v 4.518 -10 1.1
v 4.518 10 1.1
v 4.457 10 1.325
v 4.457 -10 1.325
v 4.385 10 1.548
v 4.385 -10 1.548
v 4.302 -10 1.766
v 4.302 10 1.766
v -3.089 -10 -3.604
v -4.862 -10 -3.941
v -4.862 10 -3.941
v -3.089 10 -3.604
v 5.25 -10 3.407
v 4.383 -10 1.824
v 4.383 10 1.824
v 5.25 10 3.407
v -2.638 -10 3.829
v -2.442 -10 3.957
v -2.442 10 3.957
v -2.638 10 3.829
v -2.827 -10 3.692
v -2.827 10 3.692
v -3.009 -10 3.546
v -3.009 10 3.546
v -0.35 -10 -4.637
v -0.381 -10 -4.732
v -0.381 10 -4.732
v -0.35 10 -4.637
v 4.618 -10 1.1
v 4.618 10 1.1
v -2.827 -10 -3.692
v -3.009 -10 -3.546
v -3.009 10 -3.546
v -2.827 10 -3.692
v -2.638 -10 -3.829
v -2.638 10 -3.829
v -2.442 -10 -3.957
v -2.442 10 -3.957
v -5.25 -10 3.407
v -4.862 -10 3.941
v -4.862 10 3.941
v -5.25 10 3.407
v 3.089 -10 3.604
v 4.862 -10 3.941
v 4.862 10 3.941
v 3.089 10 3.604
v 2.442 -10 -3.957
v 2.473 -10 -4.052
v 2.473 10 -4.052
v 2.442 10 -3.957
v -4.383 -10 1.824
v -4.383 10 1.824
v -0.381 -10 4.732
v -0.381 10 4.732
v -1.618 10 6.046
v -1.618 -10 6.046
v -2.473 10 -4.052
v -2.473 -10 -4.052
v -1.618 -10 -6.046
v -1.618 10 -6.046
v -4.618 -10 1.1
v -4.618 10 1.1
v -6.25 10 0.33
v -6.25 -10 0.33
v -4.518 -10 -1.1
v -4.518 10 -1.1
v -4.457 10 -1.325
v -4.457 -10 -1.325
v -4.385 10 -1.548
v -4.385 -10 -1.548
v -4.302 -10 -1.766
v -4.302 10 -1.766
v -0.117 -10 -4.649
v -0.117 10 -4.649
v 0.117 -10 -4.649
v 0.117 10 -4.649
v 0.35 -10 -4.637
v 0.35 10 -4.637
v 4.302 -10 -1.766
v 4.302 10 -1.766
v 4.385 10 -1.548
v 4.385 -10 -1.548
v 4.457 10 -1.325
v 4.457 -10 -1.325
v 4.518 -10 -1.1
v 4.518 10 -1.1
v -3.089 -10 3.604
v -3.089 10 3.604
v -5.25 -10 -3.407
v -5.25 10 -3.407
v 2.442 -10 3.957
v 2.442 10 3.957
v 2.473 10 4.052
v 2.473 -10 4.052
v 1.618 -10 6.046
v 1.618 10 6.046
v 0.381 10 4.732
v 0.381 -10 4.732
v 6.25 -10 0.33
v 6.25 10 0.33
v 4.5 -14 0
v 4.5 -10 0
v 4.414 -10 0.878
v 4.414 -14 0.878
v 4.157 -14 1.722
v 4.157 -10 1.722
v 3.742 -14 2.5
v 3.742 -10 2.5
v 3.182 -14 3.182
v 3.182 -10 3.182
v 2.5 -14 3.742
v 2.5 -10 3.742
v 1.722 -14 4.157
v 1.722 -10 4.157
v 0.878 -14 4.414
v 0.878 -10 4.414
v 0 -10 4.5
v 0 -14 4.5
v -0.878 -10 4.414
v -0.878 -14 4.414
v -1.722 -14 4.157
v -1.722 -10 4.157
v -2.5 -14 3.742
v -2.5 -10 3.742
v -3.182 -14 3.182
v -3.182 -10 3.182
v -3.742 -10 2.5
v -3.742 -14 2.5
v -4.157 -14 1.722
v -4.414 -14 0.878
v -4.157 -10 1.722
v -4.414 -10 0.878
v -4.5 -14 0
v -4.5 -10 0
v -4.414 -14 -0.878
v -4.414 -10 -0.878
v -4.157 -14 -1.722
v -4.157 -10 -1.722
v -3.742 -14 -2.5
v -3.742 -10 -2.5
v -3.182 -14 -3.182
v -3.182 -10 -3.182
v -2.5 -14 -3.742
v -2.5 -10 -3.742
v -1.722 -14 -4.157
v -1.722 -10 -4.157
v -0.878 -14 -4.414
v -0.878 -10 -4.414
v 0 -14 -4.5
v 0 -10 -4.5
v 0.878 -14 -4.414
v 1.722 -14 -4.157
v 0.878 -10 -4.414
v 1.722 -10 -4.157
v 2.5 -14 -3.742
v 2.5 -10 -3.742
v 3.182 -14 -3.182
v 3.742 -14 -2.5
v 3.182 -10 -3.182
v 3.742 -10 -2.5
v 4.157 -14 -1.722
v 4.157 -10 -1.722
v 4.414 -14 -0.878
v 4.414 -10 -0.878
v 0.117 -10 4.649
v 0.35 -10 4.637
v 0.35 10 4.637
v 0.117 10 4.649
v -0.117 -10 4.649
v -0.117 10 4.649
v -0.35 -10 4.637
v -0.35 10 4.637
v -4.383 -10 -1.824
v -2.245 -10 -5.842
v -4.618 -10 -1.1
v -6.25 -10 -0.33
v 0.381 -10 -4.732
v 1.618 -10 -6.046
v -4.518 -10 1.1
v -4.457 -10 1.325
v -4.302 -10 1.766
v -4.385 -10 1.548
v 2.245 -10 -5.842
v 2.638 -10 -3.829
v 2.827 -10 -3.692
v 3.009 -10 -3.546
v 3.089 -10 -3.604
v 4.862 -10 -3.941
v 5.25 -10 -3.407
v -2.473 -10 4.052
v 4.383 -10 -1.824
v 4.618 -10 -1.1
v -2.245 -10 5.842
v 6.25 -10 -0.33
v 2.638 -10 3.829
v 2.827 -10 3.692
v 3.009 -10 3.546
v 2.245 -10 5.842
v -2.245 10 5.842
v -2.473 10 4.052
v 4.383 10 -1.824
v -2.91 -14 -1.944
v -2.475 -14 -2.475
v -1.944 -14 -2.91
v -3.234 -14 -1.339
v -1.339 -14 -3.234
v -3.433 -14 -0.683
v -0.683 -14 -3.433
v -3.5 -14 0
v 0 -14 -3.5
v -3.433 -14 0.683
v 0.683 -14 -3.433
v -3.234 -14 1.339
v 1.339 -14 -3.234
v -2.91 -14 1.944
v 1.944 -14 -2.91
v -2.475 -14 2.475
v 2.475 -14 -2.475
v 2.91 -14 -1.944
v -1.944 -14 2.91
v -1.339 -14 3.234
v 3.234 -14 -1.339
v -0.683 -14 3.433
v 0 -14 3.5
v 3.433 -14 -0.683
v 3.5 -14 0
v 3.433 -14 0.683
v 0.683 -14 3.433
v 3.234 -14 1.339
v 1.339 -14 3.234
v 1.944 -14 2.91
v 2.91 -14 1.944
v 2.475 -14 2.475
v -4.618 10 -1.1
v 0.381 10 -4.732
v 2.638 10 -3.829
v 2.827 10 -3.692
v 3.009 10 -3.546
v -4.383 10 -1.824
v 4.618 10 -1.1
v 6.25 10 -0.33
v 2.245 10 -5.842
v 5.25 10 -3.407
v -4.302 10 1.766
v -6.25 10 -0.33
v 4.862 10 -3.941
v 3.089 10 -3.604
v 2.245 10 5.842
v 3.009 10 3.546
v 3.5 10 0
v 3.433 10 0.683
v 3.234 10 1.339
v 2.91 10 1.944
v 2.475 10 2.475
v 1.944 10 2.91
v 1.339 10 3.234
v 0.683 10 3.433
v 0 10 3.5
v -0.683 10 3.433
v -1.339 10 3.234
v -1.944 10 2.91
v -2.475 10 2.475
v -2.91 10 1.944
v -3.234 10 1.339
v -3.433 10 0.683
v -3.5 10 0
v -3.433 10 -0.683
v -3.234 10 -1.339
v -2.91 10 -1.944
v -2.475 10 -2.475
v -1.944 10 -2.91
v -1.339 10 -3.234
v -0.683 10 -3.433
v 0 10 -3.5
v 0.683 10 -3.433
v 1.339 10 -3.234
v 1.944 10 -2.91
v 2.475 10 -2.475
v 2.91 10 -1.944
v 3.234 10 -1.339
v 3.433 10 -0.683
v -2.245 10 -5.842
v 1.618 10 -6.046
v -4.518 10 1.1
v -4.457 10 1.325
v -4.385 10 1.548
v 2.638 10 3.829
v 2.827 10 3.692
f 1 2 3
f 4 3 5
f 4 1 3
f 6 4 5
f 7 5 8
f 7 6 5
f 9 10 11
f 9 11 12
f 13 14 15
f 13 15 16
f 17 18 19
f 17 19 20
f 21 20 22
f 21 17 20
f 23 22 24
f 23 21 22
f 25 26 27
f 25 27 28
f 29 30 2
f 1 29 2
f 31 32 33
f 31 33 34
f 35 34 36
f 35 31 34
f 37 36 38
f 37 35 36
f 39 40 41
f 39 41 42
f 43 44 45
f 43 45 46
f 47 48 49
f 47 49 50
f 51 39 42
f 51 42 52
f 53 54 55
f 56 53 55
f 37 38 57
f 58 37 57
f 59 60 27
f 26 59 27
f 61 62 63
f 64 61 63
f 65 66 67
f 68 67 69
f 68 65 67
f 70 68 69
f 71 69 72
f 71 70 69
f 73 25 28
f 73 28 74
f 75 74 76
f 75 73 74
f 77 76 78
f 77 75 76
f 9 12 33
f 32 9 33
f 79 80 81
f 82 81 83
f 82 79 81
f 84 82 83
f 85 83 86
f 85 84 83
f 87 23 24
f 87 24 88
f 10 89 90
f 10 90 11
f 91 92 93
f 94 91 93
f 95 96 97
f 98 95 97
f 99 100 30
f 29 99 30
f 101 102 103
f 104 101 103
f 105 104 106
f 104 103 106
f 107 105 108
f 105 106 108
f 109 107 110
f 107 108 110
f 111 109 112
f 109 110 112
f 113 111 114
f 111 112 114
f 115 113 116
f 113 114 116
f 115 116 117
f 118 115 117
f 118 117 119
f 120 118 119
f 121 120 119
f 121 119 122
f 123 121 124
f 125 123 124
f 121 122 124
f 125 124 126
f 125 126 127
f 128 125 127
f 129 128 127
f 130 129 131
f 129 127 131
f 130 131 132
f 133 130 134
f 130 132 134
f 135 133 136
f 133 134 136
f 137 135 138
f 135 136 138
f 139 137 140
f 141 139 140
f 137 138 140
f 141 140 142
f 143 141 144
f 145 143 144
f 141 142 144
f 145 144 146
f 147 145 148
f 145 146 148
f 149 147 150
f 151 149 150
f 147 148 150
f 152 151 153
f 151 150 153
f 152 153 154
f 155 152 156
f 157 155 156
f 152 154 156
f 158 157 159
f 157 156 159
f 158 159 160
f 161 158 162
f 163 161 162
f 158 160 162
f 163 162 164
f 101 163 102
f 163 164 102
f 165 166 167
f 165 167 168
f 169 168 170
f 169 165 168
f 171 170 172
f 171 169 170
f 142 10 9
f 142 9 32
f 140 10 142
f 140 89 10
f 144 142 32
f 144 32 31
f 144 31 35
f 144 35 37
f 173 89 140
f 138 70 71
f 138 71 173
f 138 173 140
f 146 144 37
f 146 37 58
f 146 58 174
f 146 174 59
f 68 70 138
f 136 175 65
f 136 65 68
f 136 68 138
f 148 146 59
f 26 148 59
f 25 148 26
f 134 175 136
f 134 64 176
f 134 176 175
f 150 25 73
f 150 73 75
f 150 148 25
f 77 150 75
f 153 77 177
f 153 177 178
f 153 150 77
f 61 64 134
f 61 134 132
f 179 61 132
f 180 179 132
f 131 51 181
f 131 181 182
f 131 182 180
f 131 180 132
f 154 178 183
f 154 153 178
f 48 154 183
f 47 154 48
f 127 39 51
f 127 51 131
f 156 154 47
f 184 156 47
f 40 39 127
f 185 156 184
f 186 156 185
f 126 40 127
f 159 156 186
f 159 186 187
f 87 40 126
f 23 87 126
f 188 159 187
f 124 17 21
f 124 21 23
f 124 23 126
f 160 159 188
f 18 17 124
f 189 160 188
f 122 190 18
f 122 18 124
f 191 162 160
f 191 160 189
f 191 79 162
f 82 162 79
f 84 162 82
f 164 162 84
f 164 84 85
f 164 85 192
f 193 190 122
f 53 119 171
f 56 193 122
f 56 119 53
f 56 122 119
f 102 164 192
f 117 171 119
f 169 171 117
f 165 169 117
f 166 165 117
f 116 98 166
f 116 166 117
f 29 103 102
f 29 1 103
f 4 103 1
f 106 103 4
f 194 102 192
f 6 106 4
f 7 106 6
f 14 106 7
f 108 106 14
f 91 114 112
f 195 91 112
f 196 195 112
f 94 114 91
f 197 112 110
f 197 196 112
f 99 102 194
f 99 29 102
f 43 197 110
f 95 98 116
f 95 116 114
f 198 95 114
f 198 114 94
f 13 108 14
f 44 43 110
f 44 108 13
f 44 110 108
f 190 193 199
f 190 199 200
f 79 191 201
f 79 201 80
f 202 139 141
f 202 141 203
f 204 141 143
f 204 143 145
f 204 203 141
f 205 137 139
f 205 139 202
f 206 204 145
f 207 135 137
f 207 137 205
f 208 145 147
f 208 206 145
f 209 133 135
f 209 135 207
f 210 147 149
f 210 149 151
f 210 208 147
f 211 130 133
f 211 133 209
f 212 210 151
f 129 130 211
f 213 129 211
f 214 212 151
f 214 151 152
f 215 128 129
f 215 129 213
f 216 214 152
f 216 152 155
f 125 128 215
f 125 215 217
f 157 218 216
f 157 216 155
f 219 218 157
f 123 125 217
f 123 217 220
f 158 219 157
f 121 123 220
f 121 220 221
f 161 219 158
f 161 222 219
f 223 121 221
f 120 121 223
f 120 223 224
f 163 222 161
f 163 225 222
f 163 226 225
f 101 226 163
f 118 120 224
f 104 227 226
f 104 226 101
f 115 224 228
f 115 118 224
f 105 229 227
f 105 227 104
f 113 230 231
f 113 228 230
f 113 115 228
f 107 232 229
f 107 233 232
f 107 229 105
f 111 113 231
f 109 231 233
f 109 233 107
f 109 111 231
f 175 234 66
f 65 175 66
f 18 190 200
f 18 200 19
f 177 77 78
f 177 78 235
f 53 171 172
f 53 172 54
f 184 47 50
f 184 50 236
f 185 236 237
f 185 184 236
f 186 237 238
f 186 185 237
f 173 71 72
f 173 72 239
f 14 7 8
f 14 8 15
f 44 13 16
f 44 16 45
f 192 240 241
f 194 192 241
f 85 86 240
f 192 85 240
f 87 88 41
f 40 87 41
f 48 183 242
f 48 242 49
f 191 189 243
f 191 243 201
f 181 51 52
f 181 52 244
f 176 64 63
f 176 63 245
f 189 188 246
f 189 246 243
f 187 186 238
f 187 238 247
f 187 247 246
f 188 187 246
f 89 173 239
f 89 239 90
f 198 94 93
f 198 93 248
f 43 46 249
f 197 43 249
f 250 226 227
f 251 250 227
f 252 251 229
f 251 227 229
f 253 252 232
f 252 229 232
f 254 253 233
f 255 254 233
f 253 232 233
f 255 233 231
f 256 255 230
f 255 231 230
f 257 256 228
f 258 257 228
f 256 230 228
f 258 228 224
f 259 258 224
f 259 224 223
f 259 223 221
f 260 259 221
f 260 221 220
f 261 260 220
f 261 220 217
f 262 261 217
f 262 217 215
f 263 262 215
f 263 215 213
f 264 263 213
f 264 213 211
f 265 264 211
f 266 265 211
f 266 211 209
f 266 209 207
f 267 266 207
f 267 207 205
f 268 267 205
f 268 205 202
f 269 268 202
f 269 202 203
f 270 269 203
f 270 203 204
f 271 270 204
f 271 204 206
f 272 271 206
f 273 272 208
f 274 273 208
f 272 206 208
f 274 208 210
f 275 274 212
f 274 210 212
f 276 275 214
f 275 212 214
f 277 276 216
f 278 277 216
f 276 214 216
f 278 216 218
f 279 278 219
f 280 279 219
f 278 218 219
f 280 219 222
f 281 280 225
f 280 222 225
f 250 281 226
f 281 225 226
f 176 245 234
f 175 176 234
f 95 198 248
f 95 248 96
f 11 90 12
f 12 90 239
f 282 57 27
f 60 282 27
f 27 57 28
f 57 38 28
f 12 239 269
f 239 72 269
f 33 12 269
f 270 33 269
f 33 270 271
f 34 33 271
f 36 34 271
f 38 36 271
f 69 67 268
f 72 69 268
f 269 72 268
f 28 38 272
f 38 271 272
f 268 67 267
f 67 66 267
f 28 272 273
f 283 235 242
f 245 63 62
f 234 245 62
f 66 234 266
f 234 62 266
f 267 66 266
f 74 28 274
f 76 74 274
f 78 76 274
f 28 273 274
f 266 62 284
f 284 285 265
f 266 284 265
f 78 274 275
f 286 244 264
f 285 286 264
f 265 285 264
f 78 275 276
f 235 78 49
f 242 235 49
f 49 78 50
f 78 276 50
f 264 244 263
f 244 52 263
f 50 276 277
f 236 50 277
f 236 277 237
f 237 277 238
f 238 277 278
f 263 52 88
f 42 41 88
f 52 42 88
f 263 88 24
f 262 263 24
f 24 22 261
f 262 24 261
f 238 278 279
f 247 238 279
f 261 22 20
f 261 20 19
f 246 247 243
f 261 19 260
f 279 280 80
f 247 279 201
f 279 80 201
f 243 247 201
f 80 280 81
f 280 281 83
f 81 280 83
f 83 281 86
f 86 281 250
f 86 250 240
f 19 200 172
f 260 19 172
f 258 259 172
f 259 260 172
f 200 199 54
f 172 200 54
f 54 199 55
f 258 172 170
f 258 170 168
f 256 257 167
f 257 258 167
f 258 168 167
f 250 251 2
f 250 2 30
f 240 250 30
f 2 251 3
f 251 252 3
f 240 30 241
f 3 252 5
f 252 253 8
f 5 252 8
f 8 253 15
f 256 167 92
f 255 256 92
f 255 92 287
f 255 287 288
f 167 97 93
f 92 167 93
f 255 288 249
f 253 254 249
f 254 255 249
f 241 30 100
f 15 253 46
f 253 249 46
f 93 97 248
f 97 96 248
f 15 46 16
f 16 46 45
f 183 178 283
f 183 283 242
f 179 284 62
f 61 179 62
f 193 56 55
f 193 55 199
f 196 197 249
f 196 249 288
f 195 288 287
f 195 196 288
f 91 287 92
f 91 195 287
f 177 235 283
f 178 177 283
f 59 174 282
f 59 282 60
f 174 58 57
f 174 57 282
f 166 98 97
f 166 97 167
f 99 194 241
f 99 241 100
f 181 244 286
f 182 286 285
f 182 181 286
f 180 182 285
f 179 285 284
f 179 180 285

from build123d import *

# Parameters (mm, degrees)
F1_DEPTH      = 10
F1_DEPTH_BACK = 10
F2_R          = 4.5
F3_DEPTH      = 4
F4_R          = 3.5
F5_DEPTH      = 25.2476


with BuildPart() as f1:
    # F0 (on Front) → F1 (new body, two sides)
    with BuildSketch(Plane.XZ) as f1_sk:
        with BuildLine():
            ThreePointArc((4.518019, -1.1), (4.616887, -0.553945), (4.65, 0))
            ThreePointArc((4.65, 0), (4.616887, 0.553945), (4.518019, 1.1))
            ThreePointArc((4.518019, 1.1), (4.422413, 1.436929), (4.301718, 1.765707))
            ThreePointArc((4.301718, 1.765707), (3.761929, 2.733201), (3.008591, 3.545544))
            ThreePointArc((3.008591, 3.545544), (2.733201, 3.761929), (2.442307, 3.956973))
            ThreePointArc((2.442307, 3.956973), (1.436929, 4.422413), (0.349983, 4.636811))
            ThreePointArc((0.349983, 4.636811), (0, 4.65), (-0.349983, 4.636811))
            ThreePointArc((-0.349983, 4.636811), (-1.436929, 4.422413), (-2.442307, 3.956973))
            ThreePointArc((-2.442307, 3.956973), (-2.733201, 3.761929), (-3.008591, 3.545544))
            ThreePointArc((-3.008591, 3.545544), (-3.761929, 2.733201), (-4.301718, 1.765707))
            ThreePointArc((-4.301718, 1.765707), (-4.422413, 1.436929), (-4.518019, 1.1))
            ThreePointArc((-4.518019, 1.1), (-4.65, 0), (-4.518019, -1.1))
            ThreePointArc((-4.518019, -1.1), (-4.422413, -1.436929), (-4.301718, -1.765707))
            ThreePointArc((-4.301718, -1.765707), (-3.761929, -2.733201), (-3.008591, -3.545544))
            ThreePointArc((-3.008591, -3.545544), (-2.733201, -3.761929), (-2.442307, -3.956973))
            ThreePointArc((-2.442307, -3.956973), (-1.436929, -4.422413), (-0.349983, -4.636811))
            ThreePointArc((-0.349983, -4.636811), (0, -4.65), (0.349983, -4.636811))
            ThreePointArc((0.349983, -4.636811), (1.436929, -4.422413), (2.442307, -3.956973))
            ThreePointArc((2.442307, -3.956973), (2.733201, -3.761929), (3.008591, -3.545544))
            ThreePointArc((3.008591, -3.545544), (3.761929, -2.733201), (4.301718, -1.765707))
            ThreePointArc((4.301718, -1.765707), (4.422413, -1.436929), (4.518019, -1.1))
        make_face()
        with BuildLine():
            ThreePointArc((4.518019, 1.1), (4.616887, 0.553945), (4.65, 0))
            ThreePointArc((4.65, 0), (4.616887, -0.553945), (4.518019, -1.1))
            Line((4.518019, -1.1), (4.618019, -1.1))
            Line((4.618019, -1.1), (6.25, -0.329923))
            Line((6.25, -0.329923), (6.25, 0))
            Line((6.25, 0), (6.25, 0.329923))
            Line((6.25, 0.329923), (4.618019, 1.1))
            Line((4.618019, 1.1), (4.518019, 1.1))
        make_face()
        with BuildLine():
            ThreePointArc((3.008591, 3.545544), (3.761929, 2.733201), (4.301718, 1.765707))
            Line((4.301718, 1.765707), (4.38262, 1.824485))
            Line((4.38262, 1.824485), (5.25028, 3.406744))
            Line((5.25028, 3.406744), (5.056356, 3.673658))
            Line((5.056356, 3.673658), (4.862432, 3.940572))
            Line((4.862432, 3.940572), (3.089492, 3.604322))
            Line((3.089492, 3.604322), (3.008591, 3.545544))
        make_face()
        with BuildLine():
            Line((4.38262, -1.824485), (4.301718, -1.765707))
            ThreePointArc((4.301718, -1.765707), (3.761929, -2.733201), (3.008591, -3.545544))
            Line((3.008591, -3.545544), (3.089492, -3.604322))
            Line((3.089492, -3.604322), (4.862432, -3.940572))
            Line((4.862432, -3.940572), (5.056356, -3.673658))
            Line((5.056356, -3.673658), (5.25028, -3.406744))
            Line((5.25028, -3.406744), (4.38262, -1.824485))
        make_face()
        with BuildLine():
            ThreePointArc((0.349983, 4.636811), (1.436929, 4.422413), (2.442307, 3.956973))
            Line((2.442307, 3.956973), (2.473209, 4.052079))
            Line((2.473209, 4.052079), (2.245132, 5.842151))
            Line((2.245132, 5.842151), (1.931356, 5.944103))
            Line((1.931356, 5.944103), (1.61758, 6.046055))
            Line((1.61758, 6.046055), (0.380884, 4.731916))
            Line((0.380884, 4.731916), (0.349983, 4.636811))
        make_face()
        with BuildLine():
            Line((2.473209, -4.052079), (2.442307, -3.956973))
            ThreePointArc((2.442307, -3.956973), (1.436929, -4.422413), (0.349983, -4.636811))
            Line((0.349983, -4.636811), (0.380884, -4.731916))
            Line((0.380884, -4.731916), (1.61758, -6.046055))
            Line((1.61758, -6.046055), (1.931356, -5.944103))
            Line((1.931356, -5.944103), (2.245132, -5.842151))
            Line((2.245132, -5.842151), (2.473209, -4.052079))
        make_face()
        with BuildLine():
            ThreePointArc((-2.442307, 3.956973), (-1.436929, 4.422413), (-0.349983, 4.636811))
            Line((-0.349983, 4.636811), (-0.380884, 4.731916))
            Line((-0.380884, 4.731916), (-1.61758, 6.046055))
            Line((-1.61758, 6.046055), (-1.931356, 5.944103))
            Line((-1.931356, 5.944103), (-2.245132, 5.842151))
            Line((-2.245132, 5.842151), (-2.473209, 4.052079))
            Line((-2.473209, 4.052079), (-2.442307, 3.956973))
        make_face()
        with BuildLine():
            Line((-0.380884, -4.731916), (-0.349983, -4.636811))
            ThreePointArc((-0.349983, -4.636811), (-1.436929, -4.422413), (-2.442307, -3.956973))
            Line((-2.442307, -3.956973), (-2.473209, -4.052079))
            Line((-2.473209, -4.052079), (-2.245132, -5.842151))
            Line((-2.245132, -5.842151), (-1.931356, -5.944103))
            Line((-1.931356, -5.944103), (-1.61758, -6.046055))
            Line((-1.61758, -6.046055), (-0.380884, -4.731916))
        make_face()
        with BuildLine():
            ThreePointArc((-4.301718, 1.765707), (-3.761929, 2.733201), (-3.008591, 3.545544))
            Line((-3.008591, 3.545544), (-3.089492, 3.604322))
            Line((-3.089492, 3.604322), (-4.862432, 3.940572))
            Line((-4.862432, 3.940572), (-5.056356, 3.673658))
            Line((-5.056356, 3.673658), (-5.25028, 3.406744))
            Line((-5.25028, 3.406744), (-4.38262, 1.824485))
            Line((-4.38262, 1.824485), (-4.301718, 1.765707))
        make_face()
        with BuildLine():
            Line((-3.089492, -3.604322), (-3.008591, -3.545544))
            ThreePointArc((-3.008591, -3.545544), (-3.761929, -2.733201), (-4.301718, -1.765707))
            Line((-4.301718, -1.765707), (-4.38262, -1.824485))
            Line((-4.38262, -1.824485), (-5.25028, -3.406744))
            Line((-5.25028, -3.406744), (-5.056356, -3.673658))
            Line((-5.056356, -3.673658), (-4.862432, -3.940572))
            Line((-4.862432, -3.940572), (-3.089492, -3.604322))
        make_face()
        with BuildLine():
            ThreePointArc((-4.518019, -1.1), (-4.65, 0), (-4.518019, 1.1))
            Line((-4.518019, 1.1), (-4.618019, 1.1))
            Line((-4.618019, 1.1), (-6.25, 0.329923))
            Line((-6.25, 0.329923), (-6.25, 0))
            Line((-6.25, 0), (-6.25, -0.329923))
            Line((-6.25, -0.329923), (-4.618019, -1.1))
            Line((-4.618019, -1.1), (-4.518019, -1.1))
        make_face()
    extrude(amount=F1_DEPTH)
    extrude(f1_sk.sketch, amount=-F1_DEPTH_BACK)

    # F2 (on face) → F3 (join)
    with BuildSketch(Plane.XZ.offset(10)):
        Circle(F2_R)
    extrude(amount=F3_DEPTH)

    # F4 (on face) → F5 (cut)
    with BuildSketch(Plane.XZ.offset(14)):
        Circle(F4_R)
    extrude(amount=-F5_DEPTH, mode=Mode.SUBTRACT)


solid = f1.part
